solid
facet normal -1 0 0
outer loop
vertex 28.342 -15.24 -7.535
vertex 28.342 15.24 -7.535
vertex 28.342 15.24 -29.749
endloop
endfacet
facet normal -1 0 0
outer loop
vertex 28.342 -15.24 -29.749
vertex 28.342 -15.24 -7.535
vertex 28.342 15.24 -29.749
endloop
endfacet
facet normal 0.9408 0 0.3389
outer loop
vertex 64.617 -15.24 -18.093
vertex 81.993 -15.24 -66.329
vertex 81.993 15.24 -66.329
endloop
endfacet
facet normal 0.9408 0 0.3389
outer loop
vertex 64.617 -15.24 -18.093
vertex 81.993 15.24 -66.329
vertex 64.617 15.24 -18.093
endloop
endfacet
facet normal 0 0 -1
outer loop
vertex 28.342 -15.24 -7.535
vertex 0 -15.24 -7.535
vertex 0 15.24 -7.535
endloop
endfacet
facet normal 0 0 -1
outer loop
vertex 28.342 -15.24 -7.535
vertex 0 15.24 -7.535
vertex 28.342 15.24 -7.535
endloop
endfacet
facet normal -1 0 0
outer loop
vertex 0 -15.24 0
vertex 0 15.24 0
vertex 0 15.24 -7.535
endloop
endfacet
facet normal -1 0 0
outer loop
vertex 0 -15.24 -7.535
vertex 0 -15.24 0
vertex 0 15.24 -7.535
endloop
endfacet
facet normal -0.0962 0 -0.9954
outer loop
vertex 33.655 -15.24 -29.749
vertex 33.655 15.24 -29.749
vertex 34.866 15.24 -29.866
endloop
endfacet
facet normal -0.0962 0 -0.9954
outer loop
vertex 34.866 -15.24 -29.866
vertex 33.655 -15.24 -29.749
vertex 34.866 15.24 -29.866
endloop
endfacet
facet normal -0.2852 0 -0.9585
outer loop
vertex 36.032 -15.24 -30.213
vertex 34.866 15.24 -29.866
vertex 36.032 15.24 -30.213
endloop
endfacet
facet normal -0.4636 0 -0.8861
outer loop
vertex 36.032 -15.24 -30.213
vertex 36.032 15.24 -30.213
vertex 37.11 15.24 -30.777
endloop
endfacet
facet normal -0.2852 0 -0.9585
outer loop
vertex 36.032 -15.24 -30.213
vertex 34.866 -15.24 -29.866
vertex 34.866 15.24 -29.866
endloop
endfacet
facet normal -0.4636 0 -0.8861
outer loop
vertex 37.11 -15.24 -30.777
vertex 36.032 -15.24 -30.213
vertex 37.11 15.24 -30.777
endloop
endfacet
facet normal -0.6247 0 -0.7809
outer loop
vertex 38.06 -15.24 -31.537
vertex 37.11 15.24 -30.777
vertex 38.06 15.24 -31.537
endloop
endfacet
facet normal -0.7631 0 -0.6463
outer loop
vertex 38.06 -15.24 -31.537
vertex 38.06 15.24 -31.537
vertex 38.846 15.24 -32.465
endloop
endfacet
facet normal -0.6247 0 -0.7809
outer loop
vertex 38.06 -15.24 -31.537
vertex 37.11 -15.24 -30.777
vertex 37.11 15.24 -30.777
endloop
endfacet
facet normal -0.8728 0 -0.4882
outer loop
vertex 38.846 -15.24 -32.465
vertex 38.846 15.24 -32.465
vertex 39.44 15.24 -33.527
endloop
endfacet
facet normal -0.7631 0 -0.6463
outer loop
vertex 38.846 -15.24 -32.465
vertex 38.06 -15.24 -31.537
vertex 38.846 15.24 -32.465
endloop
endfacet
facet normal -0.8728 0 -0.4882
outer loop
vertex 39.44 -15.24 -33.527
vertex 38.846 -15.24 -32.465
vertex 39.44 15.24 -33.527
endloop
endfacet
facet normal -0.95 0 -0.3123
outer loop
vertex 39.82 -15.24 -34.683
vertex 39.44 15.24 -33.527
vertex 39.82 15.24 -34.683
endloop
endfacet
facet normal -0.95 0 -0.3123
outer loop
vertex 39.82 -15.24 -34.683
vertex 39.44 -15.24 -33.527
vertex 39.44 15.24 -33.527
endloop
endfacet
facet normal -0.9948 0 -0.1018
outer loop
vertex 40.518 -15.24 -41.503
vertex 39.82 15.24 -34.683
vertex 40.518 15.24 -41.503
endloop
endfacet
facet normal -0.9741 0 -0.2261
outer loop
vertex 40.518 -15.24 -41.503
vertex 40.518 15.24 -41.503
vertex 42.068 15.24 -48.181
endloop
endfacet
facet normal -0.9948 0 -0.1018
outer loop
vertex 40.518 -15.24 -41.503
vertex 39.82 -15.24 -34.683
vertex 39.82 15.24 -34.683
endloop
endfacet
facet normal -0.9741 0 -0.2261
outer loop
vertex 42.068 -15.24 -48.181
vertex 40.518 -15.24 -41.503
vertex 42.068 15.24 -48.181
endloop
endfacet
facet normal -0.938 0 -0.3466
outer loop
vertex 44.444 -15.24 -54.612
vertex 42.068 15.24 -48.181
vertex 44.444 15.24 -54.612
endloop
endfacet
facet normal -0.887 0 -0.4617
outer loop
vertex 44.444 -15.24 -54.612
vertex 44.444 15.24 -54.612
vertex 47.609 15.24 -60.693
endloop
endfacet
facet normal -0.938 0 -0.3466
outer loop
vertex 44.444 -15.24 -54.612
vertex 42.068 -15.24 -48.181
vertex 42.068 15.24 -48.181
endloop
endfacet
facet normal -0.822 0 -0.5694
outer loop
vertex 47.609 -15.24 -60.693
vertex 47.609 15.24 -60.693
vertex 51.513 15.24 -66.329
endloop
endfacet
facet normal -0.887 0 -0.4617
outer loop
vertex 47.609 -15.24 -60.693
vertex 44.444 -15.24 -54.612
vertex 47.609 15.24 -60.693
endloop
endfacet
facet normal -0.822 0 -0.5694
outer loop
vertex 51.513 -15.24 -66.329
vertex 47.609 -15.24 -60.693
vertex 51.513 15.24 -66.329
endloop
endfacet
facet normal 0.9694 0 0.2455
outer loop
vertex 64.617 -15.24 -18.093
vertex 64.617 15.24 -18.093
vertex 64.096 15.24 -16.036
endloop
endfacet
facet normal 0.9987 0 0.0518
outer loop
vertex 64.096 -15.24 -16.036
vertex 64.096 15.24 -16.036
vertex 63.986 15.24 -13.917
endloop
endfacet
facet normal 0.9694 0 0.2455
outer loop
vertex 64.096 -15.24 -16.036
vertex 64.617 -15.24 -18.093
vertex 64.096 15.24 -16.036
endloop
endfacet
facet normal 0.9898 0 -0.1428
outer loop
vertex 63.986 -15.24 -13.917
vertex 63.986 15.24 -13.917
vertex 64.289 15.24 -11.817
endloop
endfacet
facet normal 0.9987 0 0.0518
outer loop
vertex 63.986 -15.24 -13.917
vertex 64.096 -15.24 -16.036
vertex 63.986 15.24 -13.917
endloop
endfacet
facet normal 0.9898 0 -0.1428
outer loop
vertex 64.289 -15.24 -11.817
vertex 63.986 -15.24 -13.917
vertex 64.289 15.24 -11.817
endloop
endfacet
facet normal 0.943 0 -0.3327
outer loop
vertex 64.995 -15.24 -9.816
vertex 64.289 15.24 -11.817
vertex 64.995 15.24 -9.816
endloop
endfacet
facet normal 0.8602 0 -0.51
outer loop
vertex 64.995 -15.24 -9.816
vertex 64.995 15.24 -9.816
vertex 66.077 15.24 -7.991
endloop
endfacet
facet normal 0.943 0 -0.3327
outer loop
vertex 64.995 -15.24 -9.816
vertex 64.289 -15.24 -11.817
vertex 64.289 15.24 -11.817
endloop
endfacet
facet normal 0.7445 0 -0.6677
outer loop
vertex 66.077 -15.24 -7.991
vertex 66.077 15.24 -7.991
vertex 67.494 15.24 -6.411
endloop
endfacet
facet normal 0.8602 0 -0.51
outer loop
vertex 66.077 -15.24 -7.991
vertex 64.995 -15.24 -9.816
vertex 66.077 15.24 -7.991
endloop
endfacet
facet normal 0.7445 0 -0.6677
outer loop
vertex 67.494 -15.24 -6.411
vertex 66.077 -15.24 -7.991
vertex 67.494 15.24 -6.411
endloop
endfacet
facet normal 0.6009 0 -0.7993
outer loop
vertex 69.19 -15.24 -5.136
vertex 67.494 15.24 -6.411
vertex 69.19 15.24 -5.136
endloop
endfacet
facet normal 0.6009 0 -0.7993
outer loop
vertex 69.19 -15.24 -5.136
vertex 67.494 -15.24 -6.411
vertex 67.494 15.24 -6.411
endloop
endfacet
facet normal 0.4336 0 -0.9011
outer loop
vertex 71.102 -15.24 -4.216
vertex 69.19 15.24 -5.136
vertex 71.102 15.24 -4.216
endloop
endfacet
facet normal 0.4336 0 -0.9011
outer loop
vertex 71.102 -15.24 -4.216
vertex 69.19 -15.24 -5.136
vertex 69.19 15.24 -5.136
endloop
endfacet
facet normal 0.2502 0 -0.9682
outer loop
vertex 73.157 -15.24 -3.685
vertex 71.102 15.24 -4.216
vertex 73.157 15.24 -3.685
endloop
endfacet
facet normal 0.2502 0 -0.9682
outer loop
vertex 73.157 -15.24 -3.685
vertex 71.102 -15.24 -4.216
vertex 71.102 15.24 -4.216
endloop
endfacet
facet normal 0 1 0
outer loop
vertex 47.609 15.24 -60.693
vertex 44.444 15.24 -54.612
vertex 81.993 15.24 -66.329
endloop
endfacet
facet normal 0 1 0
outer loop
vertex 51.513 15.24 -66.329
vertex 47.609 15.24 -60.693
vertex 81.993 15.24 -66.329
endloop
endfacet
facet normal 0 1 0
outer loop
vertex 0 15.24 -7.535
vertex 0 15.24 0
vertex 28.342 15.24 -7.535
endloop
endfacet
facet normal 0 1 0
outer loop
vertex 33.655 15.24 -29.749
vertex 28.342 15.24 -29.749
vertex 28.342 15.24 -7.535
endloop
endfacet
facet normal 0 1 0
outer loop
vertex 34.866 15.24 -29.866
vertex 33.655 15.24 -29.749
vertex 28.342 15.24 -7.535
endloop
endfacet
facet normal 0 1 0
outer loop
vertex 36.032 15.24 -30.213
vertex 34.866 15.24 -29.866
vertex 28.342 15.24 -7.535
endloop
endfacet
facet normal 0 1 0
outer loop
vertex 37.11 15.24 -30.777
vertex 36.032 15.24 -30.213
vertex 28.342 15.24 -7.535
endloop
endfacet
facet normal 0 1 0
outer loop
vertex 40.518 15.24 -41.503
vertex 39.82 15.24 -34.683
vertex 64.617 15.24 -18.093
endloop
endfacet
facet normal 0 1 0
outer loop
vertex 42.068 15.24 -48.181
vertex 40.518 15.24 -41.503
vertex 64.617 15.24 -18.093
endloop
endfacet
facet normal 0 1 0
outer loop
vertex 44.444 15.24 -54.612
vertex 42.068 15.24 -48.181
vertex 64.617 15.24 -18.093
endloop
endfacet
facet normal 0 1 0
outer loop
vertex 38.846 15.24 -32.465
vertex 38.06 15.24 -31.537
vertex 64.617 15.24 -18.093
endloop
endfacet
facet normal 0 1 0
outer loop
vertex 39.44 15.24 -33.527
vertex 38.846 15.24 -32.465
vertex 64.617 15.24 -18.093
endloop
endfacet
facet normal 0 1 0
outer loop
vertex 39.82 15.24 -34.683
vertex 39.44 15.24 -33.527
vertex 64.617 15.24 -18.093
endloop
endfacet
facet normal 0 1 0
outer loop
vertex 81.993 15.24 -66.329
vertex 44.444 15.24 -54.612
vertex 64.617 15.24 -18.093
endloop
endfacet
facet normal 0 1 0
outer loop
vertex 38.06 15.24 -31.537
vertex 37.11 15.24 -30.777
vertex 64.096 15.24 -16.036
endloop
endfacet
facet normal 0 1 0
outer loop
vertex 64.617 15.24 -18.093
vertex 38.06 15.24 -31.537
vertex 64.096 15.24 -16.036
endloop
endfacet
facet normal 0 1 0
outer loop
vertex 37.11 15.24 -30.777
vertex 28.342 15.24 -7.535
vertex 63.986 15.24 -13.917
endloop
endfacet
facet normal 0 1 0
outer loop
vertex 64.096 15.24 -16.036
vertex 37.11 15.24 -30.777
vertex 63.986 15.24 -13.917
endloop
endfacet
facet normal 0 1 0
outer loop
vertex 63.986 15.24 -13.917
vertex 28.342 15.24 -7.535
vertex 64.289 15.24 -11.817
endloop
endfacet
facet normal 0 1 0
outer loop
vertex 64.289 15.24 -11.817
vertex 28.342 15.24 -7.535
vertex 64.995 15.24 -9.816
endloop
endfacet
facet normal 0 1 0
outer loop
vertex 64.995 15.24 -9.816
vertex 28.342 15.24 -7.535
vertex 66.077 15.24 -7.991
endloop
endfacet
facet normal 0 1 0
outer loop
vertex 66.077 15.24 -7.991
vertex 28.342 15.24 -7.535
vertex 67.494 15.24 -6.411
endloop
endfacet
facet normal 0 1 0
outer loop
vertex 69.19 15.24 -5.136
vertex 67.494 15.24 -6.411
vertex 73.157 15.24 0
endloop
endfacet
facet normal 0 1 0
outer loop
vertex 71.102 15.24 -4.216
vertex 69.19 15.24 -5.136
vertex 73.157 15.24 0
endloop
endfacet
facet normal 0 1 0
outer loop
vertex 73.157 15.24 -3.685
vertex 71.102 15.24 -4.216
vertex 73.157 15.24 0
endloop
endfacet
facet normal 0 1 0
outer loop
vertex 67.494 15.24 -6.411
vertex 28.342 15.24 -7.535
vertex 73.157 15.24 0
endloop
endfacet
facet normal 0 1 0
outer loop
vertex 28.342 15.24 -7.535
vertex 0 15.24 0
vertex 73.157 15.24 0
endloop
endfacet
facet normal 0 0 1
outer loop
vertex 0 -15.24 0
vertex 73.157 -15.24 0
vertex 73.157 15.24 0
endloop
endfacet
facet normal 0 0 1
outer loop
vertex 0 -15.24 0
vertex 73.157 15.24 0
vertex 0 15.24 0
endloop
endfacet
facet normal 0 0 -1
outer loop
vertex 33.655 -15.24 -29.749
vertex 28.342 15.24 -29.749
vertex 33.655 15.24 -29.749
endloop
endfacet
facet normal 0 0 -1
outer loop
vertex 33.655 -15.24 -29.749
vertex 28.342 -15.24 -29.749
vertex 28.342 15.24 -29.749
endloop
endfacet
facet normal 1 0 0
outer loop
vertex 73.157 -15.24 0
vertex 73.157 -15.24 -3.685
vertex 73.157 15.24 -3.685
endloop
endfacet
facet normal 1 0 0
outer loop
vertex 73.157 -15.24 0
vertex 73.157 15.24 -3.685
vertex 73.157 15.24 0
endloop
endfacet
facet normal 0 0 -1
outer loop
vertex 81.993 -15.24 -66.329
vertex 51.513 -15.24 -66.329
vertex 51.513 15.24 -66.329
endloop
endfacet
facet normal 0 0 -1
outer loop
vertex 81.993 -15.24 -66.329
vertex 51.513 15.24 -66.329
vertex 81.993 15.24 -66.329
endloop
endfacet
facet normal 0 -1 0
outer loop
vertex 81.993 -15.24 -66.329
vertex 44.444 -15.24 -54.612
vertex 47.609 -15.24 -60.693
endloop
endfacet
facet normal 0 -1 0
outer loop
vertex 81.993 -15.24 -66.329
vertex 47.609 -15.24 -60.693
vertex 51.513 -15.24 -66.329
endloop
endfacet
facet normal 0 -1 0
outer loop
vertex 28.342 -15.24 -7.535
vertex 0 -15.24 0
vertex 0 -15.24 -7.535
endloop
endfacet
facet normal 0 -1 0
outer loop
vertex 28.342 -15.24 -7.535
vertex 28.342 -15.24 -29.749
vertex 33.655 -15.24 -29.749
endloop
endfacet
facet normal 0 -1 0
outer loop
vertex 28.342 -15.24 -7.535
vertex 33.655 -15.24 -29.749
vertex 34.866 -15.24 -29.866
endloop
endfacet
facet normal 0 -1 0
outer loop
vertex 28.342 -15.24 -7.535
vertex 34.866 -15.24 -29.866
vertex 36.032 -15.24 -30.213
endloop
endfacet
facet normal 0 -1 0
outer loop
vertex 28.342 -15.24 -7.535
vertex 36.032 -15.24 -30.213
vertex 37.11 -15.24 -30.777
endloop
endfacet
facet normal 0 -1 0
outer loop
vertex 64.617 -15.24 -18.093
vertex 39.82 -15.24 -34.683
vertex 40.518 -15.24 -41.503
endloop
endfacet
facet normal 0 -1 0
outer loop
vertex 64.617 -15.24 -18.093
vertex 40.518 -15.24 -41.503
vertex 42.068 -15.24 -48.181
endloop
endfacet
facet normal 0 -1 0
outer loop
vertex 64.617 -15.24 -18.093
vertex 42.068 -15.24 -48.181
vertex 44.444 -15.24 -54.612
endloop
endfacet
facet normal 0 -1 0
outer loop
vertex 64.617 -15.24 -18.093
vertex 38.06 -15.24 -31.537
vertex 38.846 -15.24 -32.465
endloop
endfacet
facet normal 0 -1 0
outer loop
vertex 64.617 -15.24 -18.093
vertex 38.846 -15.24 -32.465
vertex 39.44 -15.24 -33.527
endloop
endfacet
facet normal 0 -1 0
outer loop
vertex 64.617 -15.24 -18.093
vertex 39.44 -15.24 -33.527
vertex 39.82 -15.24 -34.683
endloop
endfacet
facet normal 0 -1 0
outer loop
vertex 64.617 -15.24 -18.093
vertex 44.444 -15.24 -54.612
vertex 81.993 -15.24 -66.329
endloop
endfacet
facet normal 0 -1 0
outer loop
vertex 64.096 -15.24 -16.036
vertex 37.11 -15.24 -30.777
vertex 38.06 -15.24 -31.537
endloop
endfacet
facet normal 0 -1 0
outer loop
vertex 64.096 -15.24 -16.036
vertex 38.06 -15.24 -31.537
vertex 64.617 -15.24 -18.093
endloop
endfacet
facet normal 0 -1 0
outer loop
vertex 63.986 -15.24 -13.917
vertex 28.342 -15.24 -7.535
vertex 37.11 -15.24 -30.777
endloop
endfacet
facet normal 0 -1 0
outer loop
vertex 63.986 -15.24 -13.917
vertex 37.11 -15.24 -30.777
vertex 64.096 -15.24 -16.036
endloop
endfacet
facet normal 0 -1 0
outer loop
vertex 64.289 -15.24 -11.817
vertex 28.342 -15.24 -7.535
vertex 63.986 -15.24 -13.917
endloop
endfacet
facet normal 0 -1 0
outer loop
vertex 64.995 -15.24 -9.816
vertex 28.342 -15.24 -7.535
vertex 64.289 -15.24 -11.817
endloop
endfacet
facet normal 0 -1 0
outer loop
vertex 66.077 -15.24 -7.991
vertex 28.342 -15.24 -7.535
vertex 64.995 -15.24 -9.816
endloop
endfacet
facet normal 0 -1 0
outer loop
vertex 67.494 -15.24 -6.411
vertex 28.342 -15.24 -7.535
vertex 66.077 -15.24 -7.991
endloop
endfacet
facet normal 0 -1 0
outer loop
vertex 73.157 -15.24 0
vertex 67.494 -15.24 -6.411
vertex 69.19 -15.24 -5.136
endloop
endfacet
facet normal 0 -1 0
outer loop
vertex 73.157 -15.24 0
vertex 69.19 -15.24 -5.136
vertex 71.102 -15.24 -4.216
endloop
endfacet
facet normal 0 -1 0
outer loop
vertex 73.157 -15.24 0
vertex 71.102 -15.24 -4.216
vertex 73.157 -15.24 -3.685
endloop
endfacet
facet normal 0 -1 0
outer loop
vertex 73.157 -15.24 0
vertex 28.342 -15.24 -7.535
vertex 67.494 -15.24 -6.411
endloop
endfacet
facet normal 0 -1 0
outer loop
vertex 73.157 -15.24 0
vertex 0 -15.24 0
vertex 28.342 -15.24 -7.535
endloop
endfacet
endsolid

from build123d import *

# Parameters (mm, degrees)
F1_DEPTH = 15.24


with BuildPart() as f1:
    # F0 (on Front) → F1 (new body, symmetric)
    with BuildSketch(Plane.XZ):
        with BuildLine():
            ThreePointArc((39.819952, -34.683209), (43.15441, -51.434249), (51.5128, -66.328987))
            Line((51.5128, -66.328987), (81.9928, -66.328987))
            Line((81.9928, -66.328987), (64.616776, -18.092548))
            ThreePointArc((64.616776, -18.092548), (65.491758, -8.876663), (73.156603, -3.68549))
            Line((73.156603, -3.68549), (73.156603, 0))
            Line((73.156603, 0), (0, 0))
            Line((0, 0), (0, -7.535368))
            Line((0, -7.535368), (28.341651, -7.535368))
            Line((28.341651, -7.535368), (28.341651, -29.748611))
            Line((28.341651, -29.748611), (33.654915, -29.748611))
            ThreePointArc((33.654915, -29.748611), (37.603267, -31.134181), (39.819952, -34.683209))
        make_face()
    extrude(amount=F1_DEPTH, both=True)


solid = f1.part
